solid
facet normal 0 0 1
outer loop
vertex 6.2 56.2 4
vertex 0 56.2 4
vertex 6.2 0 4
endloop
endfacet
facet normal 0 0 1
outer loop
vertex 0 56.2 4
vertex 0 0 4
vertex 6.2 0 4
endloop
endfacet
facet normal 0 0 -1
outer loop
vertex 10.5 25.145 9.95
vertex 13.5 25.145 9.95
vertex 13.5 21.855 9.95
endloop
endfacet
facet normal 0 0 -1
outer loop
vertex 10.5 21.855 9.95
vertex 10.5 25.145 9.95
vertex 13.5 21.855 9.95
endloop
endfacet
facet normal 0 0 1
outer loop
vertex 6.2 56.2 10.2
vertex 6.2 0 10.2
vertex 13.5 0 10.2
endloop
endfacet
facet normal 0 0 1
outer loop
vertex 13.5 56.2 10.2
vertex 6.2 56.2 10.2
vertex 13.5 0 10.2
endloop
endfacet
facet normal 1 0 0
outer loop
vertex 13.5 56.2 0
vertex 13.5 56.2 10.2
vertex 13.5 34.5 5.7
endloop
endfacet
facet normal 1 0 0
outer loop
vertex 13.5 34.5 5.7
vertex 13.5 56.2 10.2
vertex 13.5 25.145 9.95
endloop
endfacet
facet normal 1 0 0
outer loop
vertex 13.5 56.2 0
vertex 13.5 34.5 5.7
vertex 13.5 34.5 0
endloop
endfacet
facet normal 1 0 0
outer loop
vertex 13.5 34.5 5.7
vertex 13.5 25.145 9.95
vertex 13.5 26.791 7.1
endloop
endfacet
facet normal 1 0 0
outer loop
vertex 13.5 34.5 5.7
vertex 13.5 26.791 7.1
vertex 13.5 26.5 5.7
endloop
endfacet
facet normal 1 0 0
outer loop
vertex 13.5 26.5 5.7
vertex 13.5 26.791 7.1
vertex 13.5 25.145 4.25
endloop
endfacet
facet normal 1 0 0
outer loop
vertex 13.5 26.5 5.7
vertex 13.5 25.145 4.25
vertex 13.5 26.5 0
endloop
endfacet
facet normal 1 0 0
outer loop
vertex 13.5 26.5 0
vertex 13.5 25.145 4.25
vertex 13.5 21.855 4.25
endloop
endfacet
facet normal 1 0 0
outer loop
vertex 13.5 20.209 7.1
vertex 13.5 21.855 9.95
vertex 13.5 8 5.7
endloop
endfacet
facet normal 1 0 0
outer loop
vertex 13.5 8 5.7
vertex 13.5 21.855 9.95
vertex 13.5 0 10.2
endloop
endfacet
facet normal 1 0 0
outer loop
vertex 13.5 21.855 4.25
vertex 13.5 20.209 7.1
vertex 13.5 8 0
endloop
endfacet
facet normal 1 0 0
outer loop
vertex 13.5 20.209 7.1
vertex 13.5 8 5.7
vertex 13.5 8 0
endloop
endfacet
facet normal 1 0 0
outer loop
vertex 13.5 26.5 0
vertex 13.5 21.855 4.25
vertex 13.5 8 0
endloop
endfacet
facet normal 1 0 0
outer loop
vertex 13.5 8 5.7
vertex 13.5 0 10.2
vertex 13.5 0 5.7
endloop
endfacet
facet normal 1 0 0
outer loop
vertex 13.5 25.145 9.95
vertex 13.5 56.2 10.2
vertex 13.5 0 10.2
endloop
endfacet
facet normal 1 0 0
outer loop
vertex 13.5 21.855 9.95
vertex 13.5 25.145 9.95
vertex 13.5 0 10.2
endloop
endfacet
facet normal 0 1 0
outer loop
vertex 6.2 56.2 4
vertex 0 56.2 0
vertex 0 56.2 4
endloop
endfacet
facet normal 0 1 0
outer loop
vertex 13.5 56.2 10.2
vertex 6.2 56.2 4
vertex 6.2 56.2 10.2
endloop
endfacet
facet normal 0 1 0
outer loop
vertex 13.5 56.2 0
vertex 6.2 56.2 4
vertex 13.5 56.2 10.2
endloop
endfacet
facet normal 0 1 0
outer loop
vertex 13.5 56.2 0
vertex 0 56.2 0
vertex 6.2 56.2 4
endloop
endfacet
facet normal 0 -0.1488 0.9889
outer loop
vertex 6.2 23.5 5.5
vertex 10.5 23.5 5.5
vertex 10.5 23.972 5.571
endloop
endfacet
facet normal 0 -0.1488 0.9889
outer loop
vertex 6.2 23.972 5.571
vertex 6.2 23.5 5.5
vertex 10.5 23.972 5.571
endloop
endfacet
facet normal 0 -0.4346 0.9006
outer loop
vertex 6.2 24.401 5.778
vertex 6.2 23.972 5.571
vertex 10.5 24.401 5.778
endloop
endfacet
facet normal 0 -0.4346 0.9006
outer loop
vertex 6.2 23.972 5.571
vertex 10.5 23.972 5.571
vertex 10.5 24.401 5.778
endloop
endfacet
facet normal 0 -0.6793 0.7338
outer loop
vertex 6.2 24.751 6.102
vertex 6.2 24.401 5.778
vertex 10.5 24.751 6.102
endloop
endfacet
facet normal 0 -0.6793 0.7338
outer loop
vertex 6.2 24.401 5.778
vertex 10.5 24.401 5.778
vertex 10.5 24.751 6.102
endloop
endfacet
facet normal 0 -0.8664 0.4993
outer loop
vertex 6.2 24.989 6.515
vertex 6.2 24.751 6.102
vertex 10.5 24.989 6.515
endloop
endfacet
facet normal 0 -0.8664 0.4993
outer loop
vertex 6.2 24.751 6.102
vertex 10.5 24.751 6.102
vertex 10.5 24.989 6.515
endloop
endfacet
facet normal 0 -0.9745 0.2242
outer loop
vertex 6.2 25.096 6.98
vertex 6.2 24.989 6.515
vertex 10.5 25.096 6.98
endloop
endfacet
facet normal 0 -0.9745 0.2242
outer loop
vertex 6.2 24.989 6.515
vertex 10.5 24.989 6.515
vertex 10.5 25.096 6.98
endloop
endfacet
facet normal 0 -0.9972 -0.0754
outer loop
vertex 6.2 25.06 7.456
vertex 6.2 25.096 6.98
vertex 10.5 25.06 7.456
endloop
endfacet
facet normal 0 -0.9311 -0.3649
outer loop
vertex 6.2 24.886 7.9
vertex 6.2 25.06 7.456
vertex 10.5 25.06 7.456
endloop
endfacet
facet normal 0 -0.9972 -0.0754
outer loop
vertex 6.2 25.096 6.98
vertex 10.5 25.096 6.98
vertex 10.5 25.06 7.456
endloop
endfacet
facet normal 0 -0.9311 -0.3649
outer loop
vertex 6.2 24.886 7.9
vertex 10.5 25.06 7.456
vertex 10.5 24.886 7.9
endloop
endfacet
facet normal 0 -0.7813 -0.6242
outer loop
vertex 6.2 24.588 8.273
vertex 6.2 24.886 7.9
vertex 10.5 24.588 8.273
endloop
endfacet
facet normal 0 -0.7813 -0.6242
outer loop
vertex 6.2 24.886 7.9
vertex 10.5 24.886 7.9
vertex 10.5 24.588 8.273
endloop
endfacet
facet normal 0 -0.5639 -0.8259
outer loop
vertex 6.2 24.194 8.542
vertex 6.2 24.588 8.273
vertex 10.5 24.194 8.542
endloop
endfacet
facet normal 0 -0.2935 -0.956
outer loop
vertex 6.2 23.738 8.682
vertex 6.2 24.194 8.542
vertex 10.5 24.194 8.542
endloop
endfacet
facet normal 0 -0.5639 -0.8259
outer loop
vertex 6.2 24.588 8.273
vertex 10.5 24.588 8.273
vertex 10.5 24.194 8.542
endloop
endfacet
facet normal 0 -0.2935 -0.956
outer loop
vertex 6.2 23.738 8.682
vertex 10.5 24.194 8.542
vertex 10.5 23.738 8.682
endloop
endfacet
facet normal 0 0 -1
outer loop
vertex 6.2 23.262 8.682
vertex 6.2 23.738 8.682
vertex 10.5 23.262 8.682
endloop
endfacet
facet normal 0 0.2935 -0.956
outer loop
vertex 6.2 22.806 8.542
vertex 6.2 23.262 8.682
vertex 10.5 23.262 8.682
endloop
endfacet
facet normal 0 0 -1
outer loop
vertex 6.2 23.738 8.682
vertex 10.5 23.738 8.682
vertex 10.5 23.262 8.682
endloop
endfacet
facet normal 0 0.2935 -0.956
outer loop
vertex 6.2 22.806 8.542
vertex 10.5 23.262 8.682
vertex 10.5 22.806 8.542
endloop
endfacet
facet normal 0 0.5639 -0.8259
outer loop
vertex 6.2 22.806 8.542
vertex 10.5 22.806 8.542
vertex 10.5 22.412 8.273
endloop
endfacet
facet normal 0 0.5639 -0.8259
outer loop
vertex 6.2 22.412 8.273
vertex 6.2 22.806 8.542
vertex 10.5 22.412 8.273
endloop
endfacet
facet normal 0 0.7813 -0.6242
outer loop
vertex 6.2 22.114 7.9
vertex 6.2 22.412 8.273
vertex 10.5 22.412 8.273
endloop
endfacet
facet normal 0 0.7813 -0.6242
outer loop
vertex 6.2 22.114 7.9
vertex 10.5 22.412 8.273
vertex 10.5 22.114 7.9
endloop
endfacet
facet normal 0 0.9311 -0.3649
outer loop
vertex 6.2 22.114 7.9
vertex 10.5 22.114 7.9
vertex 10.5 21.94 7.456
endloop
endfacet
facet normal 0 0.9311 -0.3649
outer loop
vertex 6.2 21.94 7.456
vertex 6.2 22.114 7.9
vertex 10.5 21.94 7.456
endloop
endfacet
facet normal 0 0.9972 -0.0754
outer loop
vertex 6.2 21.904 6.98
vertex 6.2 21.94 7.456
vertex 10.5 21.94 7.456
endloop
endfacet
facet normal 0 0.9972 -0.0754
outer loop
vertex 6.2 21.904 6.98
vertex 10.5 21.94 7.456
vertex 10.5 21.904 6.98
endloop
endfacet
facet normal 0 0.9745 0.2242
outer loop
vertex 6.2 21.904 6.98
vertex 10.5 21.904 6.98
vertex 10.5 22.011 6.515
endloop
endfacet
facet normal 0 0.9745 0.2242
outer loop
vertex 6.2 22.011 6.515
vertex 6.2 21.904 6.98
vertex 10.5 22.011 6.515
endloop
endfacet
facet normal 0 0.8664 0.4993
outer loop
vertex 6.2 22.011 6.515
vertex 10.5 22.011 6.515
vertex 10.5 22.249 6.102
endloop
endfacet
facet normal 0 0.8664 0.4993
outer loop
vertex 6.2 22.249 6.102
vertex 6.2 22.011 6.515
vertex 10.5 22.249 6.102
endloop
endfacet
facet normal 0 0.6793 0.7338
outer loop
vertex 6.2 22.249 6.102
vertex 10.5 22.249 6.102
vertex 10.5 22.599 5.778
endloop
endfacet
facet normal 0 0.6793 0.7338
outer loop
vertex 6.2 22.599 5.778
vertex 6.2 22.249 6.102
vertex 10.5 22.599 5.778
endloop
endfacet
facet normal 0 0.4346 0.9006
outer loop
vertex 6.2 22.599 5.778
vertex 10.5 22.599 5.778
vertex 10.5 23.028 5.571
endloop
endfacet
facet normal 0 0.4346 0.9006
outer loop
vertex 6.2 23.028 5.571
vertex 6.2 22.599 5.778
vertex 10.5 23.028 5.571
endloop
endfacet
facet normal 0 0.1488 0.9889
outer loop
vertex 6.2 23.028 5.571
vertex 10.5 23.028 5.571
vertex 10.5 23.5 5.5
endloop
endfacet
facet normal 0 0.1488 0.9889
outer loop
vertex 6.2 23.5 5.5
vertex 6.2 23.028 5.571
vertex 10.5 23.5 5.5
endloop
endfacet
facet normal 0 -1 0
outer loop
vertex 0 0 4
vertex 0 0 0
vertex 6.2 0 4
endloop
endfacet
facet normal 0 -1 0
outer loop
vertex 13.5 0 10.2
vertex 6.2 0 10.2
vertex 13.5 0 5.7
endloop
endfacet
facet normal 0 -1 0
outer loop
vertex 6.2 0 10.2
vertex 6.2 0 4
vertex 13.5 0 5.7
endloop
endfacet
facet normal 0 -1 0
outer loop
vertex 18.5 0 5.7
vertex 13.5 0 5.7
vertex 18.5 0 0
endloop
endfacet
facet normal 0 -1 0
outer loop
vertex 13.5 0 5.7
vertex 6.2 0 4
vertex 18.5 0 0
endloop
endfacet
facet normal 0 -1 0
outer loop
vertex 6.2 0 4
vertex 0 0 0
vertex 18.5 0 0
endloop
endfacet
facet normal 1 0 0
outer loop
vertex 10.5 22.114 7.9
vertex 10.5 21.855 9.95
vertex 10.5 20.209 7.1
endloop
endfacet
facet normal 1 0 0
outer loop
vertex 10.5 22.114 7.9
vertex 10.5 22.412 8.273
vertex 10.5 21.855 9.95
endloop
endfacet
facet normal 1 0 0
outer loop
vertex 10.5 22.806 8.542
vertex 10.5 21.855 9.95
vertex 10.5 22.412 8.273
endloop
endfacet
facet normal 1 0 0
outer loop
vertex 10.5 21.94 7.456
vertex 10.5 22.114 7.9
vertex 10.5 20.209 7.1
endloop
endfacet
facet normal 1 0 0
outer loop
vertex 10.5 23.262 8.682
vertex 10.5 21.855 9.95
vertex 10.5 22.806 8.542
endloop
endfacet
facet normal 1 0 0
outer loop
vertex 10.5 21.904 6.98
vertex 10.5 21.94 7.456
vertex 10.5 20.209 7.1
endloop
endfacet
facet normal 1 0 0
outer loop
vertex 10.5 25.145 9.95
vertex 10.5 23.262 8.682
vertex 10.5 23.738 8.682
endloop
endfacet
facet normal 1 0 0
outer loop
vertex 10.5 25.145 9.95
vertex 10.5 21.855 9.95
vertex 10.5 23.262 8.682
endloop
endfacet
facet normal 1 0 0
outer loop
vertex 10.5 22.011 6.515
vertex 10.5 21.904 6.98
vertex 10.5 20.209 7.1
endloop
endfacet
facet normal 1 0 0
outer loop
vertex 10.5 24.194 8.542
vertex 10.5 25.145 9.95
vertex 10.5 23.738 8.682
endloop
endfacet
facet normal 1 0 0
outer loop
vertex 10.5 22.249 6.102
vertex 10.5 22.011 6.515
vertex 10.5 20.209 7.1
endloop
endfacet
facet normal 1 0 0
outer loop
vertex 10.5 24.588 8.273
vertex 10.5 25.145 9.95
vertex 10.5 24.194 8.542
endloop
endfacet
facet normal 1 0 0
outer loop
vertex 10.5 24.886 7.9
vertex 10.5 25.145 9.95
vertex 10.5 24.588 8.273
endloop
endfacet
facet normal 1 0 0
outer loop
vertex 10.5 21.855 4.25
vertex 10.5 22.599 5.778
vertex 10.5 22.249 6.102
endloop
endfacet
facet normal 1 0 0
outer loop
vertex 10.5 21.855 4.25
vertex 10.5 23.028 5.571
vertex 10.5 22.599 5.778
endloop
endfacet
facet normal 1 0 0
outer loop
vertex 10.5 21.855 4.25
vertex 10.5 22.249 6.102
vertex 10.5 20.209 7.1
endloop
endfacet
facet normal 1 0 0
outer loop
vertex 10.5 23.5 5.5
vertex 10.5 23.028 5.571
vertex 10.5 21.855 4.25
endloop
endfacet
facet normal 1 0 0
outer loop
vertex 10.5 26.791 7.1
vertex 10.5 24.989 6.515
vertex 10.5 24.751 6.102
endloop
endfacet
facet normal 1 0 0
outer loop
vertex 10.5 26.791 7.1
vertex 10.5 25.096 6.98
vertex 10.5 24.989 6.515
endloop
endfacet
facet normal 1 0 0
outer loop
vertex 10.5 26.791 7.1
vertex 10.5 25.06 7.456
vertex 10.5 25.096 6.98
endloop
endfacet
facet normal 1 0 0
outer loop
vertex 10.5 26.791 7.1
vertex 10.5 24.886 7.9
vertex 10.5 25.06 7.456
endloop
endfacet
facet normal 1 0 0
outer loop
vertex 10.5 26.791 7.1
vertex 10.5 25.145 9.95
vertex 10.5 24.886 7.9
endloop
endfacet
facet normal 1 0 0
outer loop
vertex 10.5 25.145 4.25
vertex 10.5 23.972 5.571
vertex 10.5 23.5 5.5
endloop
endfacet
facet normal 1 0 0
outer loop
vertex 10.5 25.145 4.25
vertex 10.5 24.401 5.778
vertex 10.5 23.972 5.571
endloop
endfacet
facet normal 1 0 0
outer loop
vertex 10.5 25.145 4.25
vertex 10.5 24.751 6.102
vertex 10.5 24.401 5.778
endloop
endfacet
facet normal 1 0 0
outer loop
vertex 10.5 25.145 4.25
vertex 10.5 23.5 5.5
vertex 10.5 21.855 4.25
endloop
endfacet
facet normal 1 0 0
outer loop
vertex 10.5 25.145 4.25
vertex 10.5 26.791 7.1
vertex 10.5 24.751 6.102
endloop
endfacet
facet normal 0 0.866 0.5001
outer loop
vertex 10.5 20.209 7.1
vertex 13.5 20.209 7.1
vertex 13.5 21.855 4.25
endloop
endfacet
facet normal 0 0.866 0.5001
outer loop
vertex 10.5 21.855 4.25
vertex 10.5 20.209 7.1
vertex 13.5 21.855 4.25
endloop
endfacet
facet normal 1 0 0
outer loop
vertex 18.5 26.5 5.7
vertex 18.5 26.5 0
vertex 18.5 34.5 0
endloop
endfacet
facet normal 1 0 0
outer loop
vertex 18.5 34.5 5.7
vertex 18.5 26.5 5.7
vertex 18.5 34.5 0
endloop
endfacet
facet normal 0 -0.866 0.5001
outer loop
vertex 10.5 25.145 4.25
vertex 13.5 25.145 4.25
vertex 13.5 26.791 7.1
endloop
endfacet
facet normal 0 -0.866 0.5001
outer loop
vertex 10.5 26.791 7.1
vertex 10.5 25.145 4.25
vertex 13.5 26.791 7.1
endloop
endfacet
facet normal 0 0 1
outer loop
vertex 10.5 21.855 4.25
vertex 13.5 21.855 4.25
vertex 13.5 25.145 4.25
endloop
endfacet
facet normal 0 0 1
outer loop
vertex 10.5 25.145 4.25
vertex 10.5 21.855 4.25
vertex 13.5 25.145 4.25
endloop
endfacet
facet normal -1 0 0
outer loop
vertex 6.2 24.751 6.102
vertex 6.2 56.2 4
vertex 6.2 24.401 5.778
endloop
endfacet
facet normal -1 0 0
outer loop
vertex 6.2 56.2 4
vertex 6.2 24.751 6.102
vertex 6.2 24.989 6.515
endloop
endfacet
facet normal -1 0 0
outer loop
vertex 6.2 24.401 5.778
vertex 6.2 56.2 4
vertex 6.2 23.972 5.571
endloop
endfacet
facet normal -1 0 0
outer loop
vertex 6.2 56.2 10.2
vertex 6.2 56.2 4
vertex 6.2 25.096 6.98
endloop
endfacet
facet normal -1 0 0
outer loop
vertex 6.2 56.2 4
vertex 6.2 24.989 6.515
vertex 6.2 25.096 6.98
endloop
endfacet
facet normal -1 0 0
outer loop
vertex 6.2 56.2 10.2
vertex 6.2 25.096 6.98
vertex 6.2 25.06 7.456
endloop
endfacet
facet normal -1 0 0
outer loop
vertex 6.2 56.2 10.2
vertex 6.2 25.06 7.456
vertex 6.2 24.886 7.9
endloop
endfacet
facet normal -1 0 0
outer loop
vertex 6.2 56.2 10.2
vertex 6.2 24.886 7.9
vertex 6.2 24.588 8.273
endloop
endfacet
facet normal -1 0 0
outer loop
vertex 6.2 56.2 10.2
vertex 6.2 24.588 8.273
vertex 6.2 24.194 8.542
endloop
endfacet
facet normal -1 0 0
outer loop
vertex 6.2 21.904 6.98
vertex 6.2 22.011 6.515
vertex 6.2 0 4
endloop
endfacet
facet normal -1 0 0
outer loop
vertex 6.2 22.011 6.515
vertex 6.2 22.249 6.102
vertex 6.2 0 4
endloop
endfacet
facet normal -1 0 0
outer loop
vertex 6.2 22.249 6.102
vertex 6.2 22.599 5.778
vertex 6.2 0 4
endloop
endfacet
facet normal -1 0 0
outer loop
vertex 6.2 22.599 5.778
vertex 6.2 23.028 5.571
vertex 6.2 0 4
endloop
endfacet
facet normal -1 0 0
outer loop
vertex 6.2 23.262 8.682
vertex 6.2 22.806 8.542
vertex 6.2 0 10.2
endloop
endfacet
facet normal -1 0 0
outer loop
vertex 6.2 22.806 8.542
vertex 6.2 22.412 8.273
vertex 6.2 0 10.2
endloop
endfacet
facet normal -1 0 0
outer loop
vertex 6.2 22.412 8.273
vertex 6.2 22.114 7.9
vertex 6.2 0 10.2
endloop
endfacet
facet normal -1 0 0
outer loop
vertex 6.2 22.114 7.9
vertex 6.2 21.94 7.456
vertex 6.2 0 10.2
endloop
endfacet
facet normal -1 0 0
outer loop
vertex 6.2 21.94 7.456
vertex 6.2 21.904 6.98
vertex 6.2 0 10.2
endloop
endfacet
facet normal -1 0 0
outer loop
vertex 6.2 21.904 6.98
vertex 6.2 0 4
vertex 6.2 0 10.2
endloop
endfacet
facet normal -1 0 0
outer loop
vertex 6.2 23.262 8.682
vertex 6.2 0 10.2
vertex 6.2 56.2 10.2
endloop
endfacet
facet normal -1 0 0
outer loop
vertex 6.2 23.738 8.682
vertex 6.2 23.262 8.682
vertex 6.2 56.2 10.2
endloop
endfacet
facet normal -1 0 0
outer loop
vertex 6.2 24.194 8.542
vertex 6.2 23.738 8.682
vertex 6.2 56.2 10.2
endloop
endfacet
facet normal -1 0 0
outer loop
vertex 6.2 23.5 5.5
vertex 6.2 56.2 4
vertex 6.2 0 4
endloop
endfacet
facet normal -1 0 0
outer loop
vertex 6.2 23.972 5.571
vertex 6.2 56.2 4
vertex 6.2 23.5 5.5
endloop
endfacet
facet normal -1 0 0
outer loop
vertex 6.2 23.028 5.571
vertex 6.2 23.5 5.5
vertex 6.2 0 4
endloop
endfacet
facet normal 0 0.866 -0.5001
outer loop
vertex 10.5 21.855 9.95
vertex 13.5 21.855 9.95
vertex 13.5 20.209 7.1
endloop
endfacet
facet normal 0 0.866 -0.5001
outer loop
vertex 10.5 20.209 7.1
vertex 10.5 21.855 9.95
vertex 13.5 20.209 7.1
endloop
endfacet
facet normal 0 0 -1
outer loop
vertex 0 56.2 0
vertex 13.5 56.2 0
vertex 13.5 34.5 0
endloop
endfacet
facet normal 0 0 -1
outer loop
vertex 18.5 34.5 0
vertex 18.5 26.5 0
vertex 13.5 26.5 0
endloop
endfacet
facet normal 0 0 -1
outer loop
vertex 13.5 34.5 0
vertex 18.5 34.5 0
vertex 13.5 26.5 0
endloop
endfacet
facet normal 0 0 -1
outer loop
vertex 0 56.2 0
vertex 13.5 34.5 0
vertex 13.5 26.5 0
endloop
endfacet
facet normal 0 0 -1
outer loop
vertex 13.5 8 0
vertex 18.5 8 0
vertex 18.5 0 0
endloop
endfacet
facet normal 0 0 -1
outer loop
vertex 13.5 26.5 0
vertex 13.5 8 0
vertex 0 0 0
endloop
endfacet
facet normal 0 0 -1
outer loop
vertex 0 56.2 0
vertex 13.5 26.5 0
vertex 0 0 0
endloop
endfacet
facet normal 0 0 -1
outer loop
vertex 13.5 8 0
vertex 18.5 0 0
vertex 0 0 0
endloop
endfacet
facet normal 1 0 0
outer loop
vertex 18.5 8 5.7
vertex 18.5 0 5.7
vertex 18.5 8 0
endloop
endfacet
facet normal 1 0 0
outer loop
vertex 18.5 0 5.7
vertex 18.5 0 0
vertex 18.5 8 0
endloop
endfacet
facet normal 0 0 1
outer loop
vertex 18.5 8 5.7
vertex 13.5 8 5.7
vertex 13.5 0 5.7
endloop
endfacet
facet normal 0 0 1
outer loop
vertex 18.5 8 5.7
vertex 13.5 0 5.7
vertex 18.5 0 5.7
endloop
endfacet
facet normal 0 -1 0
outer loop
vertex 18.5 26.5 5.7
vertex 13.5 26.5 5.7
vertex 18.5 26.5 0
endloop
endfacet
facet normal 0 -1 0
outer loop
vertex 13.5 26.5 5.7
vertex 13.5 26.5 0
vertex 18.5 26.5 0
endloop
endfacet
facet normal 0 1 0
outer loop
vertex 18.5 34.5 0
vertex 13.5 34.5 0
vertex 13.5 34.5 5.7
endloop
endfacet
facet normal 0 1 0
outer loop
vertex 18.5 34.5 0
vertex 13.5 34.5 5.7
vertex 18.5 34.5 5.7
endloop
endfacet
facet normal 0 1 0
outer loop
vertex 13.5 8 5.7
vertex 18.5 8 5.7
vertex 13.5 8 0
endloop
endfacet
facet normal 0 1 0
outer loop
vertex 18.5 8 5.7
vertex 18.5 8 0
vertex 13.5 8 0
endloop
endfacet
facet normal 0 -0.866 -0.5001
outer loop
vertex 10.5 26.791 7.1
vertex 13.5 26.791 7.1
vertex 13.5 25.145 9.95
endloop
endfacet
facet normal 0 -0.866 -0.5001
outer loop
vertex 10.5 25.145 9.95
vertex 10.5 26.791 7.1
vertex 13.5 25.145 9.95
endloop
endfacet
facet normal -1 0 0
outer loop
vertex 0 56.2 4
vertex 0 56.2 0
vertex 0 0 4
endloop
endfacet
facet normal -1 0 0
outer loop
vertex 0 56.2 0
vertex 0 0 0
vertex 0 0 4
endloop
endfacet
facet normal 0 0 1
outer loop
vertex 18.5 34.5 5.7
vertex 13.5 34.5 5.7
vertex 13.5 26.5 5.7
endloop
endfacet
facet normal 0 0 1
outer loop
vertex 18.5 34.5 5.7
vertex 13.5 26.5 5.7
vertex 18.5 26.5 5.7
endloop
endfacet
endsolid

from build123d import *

# Parameters (mm, degrees)
SALIENTE_EXTRUIR3_DEPTH = 4
SALIENTE_EXTRUIR4_DEPTH = 1.7
CROQUIS7_W              = 7.3
CROQUIS7_H              = 34.5
SALIENTE_EXTRUIR5_DEPTH = 4.5
CORTAR_EXTRUIR3_REACH   = 15.5
CROQUIS8_R              = 1.6
CORTAR_EXTRUIR4_DEPTH   = 3
SALIENTE_EXTRUIR6_DEPTH = 21.7


with BuildPart() as part:
    # Croquis5 → Saliente-Extruir3 (new body)
    with BuildSketch(Plane.XY):
        Polygon((18.5, 26.5), (18.5, 34.5), (0, 34.5), (0, 0), (18.5, 0), (18.5, 8), (13.5, 8), (13.5, 26.5), align=None)
    extrude(amount=SALIENTE_EXTRUIR3_DEPTH)

    # Croquis6 → Saliente-Extruir4 (add)
    with BuildSketch(Plane.XY.offset(4)):
        Polygon((6.2, 34.5), (6.2, 0), (18.5, 0), (18.5, 8), (13.5, 8), (13.5, 26.5), (18.5, 26.5), (18.5, 34.5), align=None)
    extrude(amount=SALIENTE_EXTRUIR4_DEPTH)

    # Croquis7 → Saliente-Extruir5 (add)
    with BuildSketch(Plane.XY.offset(5.7)):
        with Locations((9.85, 17.25)):
            Rectangle(CROQUIS7_W, CROQUIS7_H)
    extrude(amount=SALIENTE_EXTRUIR5_DEPTH)

    # Croquis8 → Cortar-Extruir3 (cut, up to next)
    with BuildSketch(Plane(origin=(13.5, 0, 0), x_dir=(0, 0, -1), z_dir=(1, 0, 0)), mode=Mode.PRIVATE) as cortar_extruir3_sk1:
        with Locations((-7.1, 23.5)):
            Circle(CROQUIS8_R)
    cortar_extruir3_tool1 = extrude(cortar_extruir3_sk1.sketch, amount=-CORTAR_EXTRUIR3_REACH, mode=Mode.PRIVATE) & part.part
    add(cortar_extruir3_tool1.solids().sort_by_distance((13.5, 23.5, 7.1))[0], mode=Mode.SUBTRACT)

    # Croquis9 → Cortar-Extruir4 (cut)
    with BuildSketch(Plane(origin=(13.5, 0, 0), x_dir=(0, 0, -1), z_dir=(1, 0, 0))):
        Polygon((-7.1, 26.790896534), (-9.95, 25.145448267), (-9.95, 21.854551733), (-7.1, 20.209103466), (-4.25, 21.854551733), (-4.25, 25.145448267), align=None)
    extrude(amount=-CORTAR_EXTRUIR4_DEPTH, mode=Mode.SUBTRACT)

    # Croquis10 → Saliente-Extruir6 (add)
    with BuildSketch(Plane(origin=(0, 34.5, 0), x_dir=(1, 0, 0), z_dir=(0, 1, 0))):
        Polygon((13.5, -5.7), (13.5, 0), (0, 0), (0, -4), (6.2, -4), (6.2, -10.2), (13.5, -10.2), align=None)
    extrude(amount=SALIENTE_EXTRUIR6_DEPTH)


solid = part.part
